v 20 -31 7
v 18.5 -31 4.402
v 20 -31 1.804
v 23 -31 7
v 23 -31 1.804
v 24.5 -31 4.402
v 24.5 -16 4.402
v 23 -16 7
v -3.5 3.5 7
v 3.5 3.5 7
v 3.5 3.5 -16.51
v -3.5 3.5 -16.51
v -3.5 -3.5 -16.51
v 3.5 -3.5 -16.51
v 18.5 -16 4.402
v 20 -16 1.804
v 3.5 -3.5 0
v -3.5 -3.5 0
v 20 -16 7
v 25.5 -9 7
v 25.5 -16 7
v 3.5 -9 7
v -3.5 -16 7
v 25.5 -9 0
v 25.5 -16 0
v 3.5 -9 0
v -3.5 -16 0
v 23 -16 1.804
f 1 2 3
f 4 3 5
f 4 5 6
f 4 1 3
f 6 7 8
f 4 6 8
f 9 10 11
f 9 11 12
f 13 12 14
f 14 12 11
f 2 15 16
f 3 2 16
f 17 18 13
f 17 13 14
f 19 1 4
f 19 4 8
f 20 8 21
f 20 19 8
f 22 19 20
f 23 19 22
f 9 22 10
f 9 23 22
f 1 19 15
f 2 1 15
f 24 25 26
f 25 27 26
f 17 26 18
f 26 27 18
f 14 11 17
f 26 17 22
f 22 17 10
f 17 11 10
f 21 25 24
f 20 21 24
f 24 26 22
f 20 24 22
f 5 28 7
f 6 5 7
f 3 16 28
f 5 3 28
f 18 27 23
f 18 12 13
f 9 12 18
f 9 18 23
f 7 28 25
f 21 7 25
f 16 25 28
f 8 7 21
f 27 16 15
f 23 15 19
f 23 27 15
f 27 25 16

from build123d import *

# Parameters (mm, degrees)
F0_W     = 7
F0_H     = 7
F1_DEPTH = 16.51
F3_W     = 7
F3_H     = 7
F4_DEPTH = 19.5
F5_W     = 7
F5_H     = 7
F6_DEPTH = 22
F8_DEPTH = 15


with BuildPart() as f1:
    # F0 (on Top) → F1 (new body)
    with BuildSketch(Plane.XY):
        Rectangle(F0_W, F0_H)
    extrude(amount=-F1_DEPTH)

    # F3 (on face) → F4 (join, through all)
    with BuildSketch(Plane(origin=(0, 3.5, 0), x_dir=(-1, 0, 0), z_dir=(0, 1, 0))):
        with Locations((0, 3.5)):
            Rectangle(F3_W, F3_H)
    extrude(amount=-F4_DEPTH)

    # F5 (on face) → F6 (join, through all)
    with BuildSketch(Plane.YZ.offset(3.5)):
        with Locations((-12.5, 3.5)):
            Rectangle(F5_W, F5_H)
    extrude(amount=F6_DEPTH)

    # F7 (on face) → F8 (join)
    with BuildSketch(Plane.XZ.offset(16)):
        Polygon((23, 7), (20, 7), (18.5, 4.401924), (20, 1.803848), (23, 1.803848), (24.5, 4.401924), align=None)
    extrude(amount=F8_DEPTH)


solid = f1.part
